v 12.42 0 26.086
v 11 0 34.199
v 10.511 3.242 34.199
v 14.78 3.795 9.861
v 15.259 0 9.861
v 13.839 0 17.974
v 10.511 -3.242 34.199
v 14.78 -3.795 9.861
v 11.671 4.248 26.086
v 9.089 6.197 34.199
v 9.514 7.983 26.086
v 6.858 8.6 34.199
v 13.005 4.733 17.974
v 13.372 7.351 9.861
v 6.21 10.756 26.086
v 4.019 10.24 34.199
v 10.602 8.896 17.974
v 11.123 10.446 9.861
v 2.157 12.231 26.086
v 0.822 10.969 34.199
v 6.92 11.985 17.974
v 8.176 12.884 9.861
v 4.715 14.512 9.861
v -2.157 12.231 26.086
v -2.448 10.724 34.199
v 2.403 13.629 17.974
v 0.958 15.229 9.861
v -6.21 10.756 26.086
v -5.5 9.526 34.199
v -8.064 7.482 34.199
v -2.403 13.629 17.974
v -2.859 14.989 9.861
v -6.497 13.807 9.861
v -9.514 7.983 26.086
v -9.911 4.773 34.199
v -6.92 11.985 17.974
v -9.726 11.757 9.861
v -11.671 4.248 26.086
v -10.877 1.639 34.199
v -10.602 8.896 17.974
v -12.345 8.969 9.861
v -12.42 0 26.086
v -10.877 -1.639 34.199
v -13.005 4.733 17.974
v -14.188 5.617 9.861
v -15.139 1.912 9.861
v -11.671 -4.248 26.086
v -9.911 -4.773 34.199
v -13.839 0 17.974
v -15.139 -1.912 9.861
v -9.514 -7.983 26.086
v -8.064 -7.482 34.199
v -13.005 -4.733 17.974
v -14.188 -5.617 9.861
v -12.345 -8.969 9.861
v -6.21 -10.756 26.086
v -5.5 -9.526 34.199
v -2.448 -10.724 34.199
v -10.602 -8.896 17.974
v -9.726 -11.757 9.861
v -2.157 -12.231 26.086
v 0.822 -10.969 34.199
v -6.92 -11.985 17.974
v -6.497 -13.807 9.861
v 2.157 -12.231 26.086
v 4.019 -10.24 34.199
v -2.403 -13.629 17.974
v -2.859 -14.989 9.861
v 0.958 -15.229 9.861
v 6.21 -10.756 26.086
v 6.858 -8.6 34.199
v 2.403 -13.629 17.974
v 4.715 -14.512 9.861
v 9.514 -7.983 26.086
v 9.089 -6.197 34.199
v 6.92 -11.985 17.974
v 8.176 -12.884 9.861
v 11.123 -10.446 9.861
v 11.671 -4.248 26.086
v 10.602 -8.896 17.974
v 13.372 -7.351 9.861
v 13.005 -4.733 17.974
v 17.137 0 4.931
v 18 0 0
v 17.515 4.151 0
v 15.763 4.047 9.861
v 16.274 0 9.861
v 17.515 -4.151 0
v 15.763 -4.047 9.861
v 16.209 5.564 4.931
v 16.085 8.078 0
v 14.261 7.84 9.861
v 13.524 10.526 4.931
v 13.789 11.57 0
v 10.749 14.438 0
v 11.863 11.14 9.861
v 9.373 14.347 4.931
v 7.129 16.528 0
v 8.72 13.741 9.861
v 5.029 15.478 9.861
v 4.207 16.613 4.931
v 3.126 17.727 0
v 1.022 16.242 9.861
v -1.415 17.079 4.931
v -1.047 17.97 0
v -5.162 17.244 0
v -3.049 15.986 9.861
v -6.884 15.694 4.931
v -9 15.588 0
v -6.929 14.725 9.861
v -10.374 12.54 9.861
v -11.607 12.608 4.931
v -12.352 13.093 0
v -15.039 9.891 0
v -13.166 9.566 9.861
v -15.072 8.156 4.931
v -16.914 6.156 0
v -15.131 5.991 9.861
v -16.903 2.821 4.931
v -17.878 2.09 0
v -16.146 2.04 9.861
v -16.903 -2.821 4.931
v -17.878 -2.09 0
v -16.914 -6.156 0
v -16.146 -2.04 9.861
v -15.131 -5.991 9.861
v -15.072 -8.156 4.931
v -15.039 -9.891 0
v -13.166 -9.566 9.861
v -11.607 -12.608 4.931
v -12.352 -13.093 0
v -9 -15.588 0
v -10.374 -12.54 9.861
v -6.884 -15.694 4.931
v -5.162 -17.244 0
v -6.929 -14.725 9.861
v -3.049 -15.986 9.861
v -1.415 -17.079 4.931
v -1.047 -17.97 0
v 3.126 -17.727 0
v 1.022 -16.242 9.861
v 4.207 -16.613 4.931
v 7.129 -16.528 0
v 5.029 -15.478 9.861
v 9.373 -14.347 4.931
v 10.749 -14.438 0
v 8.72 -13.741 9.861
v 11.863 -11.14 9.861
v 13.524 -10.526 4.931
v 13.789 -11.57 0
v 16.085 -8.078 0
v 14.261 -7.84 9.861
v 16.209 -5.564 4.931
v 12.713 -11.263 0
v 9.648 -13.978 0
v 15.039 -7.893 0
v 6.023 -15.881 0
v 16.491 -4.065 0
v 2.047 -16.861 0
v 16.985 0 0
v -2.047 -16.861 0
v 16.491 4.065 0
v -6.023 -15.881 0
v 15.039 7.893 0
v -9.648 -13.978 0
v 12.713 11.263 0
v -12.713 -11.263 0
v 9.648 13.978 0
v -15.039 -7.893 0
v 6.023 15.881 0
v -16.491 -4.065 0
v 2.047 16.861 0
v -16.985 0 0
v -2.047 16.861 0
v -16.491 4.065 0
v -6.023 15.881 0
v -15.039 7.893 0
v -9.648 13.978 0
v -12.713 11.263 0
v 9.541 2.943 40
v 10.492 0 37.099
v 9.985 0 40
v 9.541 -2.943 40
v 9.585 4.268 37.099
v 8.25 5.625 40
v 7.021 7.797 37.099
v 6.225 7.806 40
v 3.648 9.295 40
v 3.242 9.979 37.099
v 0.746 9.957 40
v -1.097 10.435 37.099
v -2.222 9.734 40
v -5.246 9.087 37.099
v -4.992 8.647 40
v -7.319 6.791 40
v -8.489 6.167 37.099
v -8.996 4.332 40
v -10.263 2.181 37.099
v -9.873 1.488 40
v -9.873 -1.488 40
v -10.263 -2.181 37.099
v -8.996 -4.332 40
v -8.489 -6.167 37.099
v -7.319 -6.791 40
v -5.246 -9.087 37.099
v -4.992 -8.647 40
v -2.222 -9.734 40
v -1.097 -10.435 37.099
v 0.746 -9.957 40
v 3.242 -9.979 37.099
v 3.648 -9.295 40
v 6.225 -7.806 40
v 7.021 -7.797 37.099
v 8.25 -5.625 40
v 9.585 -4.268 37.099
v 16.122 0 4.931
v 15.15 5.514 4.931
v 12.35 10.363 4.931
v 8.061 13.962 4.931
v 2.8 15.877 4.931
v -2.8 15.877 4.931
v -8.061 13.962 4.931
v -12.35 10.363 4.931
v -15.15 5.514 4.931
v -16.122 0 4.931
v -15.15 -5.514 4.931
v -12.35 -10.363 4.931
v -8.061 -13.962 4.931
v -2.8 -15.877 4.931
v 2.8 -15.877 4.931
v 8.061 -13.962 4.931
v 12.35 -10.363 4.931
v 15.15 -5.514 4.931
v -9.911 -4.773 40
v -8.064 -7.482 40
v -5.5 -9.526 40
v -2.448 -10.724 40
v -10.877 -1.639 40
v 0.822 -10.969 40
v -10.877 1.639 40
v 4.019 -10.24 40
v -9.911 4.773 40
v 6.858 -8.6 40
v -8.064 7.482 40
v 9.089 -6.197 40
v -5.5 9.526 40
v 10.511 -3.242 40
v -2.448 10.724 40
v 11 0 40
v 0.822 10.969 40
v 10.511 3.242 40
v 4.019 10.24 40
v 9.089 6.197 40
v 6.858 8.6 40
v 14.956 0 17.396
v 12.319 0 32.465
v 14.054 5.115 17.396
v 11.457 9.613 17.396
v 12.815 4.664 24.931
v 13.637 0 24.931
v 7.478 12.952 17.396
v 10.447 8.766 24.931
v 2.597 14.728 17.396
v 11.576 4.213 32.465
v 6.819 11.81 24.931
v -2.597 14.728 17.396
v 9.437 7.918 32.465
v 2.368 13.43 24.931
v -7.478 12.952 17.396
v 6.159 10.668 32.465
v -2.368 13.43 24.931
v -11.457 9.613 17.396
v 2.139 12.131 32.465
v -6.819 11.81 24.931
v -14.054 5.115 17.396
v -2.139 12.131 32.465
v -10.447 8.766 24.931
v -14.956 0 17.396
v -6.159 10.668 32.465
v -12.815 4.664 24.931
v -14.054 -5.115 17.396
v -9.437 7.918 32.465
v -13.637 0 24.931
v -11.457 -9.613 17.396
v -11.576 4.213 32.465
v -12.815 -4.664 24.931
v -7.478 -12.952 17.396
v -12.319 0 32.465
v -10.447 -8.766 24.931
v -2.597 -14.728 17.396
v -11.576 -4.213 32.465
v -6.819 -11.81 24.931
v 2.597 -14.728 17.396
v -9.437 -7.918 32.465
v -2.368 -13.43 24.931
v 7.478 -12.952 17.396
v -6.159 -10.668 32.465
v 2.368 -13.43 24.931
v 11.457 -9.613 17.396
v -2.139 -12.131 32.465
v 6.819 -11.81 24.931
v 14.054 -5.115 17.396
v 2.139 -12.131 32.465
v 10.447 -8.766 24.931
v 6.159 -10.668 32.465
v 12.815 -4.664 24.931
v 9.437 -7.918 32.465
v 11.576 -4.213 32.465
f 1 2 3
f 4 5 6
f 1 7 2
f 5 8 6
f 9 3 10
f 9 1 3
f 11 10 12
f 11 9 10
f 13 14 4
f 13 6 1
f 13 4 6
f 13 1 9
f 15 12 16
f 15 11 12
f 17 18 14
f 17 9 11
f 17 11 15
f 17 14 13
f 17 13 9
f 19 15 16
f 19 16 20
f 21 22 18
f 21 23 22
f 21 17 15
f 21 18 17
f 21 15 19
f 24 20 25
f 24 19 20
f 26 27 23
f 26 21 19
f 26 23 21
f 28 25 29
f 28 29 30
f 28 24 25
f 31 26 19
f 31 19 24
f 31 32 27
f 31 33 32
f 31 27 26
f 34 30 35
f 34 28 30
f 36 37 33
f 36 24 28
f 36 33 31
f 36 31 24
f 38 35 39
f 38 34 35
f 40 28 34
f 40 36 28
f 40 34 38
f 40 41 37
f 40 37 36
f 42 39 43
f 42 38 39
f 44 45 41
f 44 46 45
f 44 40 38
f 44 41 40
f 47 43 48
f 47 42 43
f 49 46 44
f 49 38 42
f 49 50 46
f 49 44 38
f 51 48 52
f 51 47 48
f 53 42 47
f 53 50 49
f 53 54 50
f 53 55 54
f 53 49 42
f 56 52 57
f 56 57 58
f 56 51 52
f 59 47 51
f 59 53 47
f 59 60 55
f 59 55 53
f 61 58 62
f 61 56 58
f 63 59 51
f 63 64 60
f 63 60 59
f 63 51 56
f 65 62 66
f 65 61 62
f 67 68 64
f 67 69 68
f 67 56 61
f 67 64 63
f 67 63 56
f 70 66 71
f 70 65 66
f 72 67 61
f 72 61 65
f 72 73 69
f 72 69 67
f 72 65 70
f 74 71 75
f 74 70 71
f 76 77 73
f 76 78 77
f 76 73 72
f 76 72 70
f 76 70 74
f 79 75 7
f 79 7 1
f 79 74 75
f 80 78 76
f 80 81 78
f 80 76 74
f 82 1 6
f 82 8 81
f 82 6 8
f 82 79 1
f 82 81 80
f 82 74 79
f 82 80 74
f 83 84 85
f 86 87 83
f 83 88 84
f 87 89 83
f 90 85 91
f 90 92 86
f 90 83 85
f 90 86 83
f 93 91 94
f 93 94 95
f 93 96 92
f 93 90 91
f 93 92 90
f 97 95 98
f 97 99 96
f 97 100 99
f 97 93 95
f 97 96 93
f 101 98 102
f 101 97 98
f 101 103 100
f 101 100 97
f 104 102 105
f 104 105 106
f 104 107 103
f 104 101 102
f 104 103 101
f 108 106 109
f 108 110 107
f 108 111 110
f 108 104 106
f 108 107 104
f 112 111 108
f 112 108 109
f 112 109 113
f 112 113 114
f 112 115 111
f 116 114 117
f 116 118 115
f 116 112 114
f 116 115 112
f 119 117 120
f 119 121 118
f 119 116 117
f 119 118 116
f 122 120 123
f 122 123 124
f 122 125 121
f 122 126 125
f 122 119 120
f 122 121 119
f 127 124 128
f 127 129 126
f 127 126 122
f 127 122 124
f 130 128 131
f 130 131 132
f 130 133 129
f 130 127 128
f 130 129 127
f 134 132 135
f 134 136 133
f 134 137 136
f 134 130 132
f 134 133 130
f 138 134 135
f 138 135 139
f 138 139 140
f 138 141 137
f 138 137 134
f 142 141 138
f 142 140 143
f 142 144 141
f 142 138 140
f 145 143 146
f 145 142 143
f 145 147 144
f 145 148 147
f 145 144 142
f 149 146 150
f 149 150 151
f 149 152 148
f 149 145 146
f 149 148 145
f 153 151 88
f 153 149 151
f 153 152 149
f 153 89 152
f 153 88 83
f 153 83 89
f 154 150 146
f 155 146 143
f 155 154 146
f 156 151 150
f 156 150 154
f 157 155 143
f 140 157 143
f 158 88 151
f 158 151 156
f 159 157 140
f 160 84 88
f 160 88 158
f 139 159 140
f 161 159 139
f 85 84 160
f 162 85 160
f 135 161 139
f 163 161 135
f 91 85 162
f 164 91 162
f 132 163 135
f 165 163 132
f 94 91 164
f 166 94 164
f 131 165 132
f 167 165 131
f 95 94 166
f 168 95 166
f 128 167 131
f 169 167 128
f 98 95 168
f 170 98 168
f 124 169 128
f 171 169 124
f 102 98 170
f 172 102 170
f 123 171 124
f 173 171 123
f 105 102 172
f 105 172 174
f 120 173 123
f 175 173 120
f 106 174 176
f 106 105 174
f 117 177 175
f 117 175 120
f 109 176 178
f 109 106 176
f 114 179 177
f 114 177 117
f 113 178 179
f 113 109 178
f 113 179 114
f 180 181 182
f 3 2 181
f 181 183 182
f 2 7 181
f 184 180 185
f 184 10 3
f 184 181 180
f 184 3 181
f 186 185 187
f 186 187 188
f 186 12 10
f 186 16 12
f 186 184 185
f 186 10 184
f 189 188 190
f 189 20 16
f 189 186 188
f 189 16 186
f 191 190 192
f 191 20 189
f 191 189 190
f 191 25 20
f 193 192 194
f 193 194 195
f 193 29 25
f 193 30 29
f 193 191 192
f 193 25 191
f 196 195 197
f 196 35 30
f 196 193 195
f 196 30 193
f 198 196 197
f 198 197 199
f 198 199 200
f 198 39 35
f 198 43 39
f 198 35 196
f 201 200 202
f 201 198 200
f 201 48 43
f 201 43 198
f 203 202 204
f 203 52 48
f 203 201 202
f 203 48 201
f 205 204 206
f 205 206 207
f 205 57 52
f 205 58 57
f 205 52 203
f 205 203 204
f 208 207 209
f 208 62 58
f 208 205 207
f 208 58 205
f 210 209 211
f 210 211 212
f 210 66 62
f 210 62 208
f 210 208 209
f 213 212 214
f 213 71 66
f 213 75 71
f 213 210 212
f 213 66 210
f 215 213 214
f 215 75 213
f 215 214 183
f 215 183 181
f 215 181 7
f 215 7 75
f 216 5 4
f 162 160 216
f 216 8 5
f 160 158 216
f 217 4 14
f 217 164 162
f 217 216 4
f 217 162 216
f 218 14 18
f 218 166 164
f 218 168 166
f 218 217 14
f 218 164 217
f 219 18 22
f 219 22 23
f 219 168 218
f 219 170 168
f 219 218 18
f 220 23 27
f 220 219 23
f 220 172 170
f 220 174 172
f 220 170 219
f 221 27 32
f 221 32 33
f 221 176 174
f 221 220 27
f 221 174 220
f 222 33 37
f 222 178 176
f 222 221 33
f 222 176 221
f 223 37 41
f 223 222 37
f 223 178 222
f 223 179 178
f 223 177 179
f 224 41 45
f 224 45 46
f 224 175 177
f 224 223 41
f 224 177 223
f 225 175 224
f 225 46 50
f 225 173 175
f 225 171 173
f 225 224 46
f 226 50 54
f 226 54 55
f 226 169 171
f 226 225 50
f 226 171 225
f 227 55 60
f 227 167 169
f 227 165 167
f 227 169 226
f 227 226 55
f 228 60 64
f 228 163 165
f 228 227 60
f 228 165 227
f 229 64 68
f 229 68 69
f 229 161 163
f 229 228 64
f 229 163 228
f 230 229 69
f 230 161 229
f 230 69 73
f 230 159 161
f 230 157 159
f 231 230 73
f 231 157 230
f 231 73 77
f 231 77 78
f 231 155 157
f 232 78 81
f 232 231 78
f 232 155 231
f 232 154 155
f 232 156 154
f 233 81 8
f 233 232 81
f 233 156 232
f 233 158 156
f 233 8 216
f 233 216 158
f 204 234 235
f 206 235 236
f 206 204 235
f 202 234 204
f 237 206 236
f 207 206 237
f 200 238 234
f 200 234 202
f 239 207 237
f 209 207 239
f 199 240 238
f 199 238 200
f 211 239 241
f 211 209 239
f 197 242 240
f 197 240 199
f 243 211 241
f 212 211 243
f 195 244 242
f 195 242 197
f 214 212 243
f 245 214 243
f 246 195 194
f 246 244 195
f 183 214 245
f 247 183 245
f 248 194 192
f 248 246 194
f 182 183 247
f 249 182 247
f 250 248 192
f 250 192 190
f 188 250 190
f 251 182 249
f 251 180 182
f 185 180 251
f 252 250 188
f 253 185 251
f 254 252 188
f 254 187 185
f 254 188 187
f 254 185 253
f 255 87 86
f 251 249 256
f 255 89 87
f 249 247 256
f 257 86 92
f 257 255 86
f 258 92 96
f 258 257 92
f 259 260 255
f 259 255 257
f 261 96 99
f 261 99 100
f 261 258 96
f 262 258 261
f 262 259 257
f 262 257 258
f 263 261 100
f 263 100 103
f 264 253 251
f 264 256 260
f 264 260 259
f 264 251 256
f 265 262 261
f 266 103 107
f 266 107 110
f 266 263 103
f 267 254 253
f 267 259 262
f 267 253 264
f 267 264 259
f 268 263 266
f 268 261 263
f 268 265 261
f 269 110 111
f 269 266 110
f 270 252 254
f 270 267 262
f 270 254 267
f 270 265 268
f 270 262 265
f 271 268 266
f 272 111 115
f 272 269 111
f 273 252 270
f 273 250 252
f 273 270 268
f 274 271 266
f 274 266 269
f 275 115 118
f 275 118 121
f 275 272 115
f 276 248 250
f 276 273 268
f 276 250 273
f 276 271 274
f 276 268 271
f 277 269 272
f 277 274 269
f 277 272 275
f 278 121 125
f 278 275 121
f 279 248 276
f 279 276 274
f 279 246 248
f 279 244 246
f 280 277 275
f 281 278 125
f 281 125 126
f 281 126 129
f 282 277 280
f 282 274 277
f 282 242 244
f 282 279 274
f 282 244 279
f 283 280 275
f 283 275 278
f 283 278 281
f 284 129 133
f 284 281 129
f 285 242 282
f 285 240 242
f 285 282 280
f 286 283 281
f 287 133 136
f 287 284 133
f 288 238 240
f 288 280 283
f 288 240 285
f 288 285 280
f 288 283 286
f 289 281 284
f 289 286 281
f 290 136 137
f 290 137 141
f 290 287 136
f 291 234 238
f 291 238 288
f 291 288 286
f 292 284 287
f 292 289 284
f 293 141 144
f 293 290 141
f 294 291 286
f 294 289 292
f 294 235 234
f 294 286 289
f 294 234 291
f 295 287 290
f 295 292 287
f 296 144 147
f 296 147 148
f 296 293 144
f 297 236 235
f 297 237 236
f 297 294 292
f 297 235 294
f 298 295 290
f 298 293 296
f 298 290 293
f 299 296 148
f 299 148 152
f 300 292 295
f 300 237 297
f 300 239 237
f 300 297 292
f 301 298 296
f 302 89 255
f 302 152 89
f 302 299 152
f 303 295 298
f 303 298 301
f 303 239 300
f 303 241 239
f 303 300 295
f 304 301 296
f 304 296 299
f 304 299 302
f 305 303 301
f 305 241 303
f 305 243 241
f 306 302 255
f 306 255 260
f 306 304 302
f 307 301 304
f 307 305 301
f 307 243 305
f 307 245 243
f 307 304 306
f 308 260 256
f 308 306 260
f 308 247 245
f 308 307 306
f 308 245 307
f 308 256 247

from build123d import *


with BuildPart() as f1:
    # F0 (on Front) → F1 (revolve)
    with BuildSketch(Plane.XZ):
        Polygon((15.2590650846, 9.8613593727), (16.9848029748, 0), (18, 0), (16.2742621098, 9.8613593727), align=None)
        Polygon((11, 40), (11, 34.1988741416), (15.2590650846, 9.8613593727), (16.2742621098, 9.8613593727), align=None)
        Polygon((9.9848029748, 40), (11, 34.1988741416), (11, 40), align=None)
    revolve(axis=Axis((0, 0, 20), (0, 0, 1)))


solid = f1.part
